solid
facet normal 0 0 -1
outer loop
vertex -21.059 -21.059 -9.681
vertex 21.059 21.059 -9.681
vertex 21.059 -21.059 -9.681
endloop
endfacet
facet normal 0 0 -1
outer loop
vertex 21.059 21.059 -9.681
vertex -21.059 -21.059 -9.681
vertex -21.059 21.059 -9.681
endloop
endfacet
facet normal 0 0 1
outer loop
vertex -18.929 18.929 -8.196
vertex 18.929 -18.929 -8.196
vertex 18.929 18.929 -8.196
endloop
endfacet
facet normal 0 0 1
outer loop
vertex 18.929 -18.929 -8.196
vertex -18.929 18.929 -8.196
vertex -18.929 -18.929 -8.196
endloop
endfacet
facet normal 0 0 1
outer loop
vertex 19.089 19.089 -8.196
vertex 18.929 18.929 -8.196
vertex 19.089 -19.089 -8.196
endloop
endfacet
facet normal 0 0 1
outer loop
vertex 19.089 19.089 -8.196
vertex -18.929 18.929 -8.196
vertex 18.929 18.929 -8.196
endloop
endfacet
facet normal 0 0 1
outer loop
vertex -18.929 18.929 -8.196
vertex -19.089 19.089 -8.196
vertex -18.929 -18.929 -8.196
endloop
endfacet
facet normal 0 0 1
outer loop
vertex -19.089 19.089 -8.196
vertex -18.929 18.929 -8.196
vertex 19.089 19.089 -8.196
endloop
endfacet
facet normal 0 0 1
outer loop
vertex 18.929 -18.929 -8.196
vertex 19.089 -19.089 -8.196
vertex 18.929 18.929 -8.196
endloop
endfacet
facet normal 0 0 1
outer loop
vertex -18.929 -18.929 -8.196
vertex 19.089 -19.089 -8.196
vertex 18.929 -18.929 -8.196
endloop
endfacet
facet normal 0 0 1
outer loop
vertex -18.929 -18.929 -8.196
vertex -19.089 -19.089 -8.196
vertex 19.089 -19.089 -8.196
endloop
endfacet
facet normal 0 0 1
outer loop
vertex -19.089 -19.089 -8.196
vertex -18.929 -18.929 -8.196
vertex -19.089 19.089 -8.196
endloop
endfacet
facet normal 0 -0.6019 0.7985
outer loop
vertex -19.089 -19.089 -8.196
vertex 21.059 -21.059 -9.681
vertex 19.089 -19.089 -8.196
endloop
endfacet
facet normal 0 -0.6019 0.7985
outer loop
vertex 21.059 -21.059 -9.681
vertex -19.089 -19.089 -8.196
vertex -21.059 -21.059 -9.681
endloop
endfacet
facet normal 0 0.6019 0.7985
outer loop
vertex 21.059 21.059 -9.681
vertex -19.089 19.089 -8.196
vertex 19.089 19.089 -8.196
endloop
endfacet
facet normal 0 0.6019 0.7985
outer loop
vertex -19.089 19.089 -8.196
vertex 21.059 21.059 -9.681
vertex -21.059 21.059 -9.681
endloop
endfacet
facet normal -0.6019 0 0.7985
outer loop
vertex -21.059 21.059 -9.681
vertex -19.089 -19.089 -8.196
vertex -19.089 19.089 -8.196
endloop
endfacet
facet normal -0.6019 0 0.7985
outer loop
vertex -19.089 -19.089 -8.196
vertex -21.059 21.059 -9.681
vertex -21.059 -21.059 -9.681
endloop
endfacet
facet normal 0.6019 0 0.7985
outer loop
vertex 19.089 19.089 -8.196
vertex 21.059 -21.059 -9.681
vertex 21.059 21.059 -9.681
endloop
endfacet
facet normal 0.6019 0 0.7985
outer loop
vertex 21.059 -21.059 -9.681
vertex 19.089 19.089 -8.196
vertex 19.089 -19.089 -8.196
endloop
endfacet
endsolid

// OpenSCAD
arete = 46.1;
hauteur = 29.336;
paroi = 1.5;
biseau = 1; // booléen
echelleReductionAjustementBouchon = 0.97;
libEcho=false;


hauteurInterieure = hauteur - 3 * paroi;
areteInterieure = hauteurInterieure * arete / hauteur;

echo(areteInterieure);


//forme_creuse();
//decoupe_bouchon();
// corps_ouvert();
bouchon();


module corps_ouvert() {
    render(convexity=2)
    rotate([180-51.8, 0, 0])
    difference() {
        forme_creuse();
        decoupe_bouchon();
    }
}

module bouchon() {
    render()
//    rotate([180, 0, 0])
    scale([echelleReductionAjustementBouchon, echelleReductionAjustementBouchon, 0.99])
    difference () {
        intersection() {
            forme_creuse();
            decoupe_bouchon(echelleReductionAjustementBouchon);
        }
    }
}

module forme_creuse() {
    difference() {
        pyramid(side=arete, height=hauteur, square=true, centerHorizontal=true, centerVertical=true);
        pyramid(side=areteInterieure, height=hauteurInterieure, square=true, centerHorizontal=true, centerVertical=true);
    }
}

module decoupe_bouchon(scale=1) {
    distance = -hauteur/3;
    $fn=4;
    if (biseau) {
        rotate([0,0,45]) translate([0,0, distance])
            cylinder(paroi, r=arete*0.666, r2=(arete-paroi)*0.624);
    } else {
        rotate([0,0,45]) translate([0,0, distance])
            cylinder(paroi, r=arete*0.65, center=true);
        rotate([0,0,45]) translate([0,0, distance+paroi/2])
            cylinder(paroi, r=(arete-paroi)*0.62, center=true);
    }
}





/*      MY Libraries v1.1 - Common Components
        Unless stated otherwise, all modules
        are by Randy Young <dadick83@hotmail.com>
        2010, 2011.   License, GPL v2 or later
**************************************************/

displayMode= rezScreen();  // (resolution)

function rezPrinter()=0;
function rezScreen()=1;

function resolution(value) =
    displayMode==1 ? 360 : value*2*3.141592; // ~1mm resolution for printer
$fn=resolution(4); // default for cylinder & sphere

function vectorDistance(v1, v2) =
    sqrt((pow(v2[0]-v1[0],2)+pow(v2[1]-v1[1],2))+pow(v2[2]-v1[2],2));
// function for linear measurement from 2, 3d vectors)

ep=0.01; //small number to avoid overlaps (non-manifold models)
in=25.4; //inches to millimeter conversion


/***** ROTATION & TRANSLATION SHORTCUTS  *****
Used for common, easy to type single axis moves
with names I can actually remember (since I never
get the rotation directions right on first try. :o)   */

function tighten (angle=90) =
        [0,0,-1*angle];

function loosen (angle=90) =
        [0,0,angle];

function righty (angle=90) =
        [0,angle,0];

function lefty (angle=90) =
        [0,-1*angle,0];

function backward (angle=90) =
        [-1*angle,0,0];

function forward (angle=90) =
        [angle,0,0];

function push(distance=1) =
        [0,distance,0];

function lift(distance=1) =
        [0,0,distance];

function slide(distance=1) =
        [distance,0,0];

/*************************************************
BASIC ENGINEERING SHAPES */

module hex (width=10, height=10, flats= true, center=false){
    radius= (flats == true ? width/sin(60)/2 : width/2 );
        cylinder (r=radius, h=height, center=center, $fn=6);
}

module equilateralTriangle (side=10, height=10, center=false){
    translate(center==true ? [-side/2,-sqrt(3)*side/6,-height/2] : [0,0,0])
        linear_extrude(height=height)
            polygon(points=[[0,0],[side,0],[side/2,sqrt(3)*side/2]]);
}

module pyramid(side=10, height=-1, square=false, centerHorizontal=true, centerVertical=false){
// creates a 3 or 4 sided pyramid.  -1 height= tetrahedron or Johnson's Solid square pyramid
    mHeight= height!=-1 ? height:
        square == true ? (1/sqrt(2))*side:      //square
            sqrt(6)/3*side;                     //tetra
    vert= centerVertical!=true ? [0,0,0]:
        square==false ? [0,0,-mHeight/4] :   //inscribes a tetra inside a sphere, not 1/2 ht
            [0,0,-mHeight/3];   //for squares, center=false inscribes, so true is just 1/2 ht
    horiz= centerHorizontal!= true ? [0,0,0] :
        square == true ? [-side/2, -side/2, 0] :    //square
            [-side/2,-sqrt(3)*side/6 ,0];           //tetra
    translate(vert+horiz){
        if (square == true){
            polyhedron (    points = [[0,0,0],[0,side,0],[side,side,0],
                                [side,0,0],[side/2,side/2,mHeight]],
                        faces = [[1,0,2], [2,0,3], [0,4,3],
                                [3,4,2], [2,4,1], [1,4,0]]);
        }
        if (square != true){
            polyhedron (    points = [[0,0,0],[side,0,0],[side/2,sqrt(3)*side/2,0],
                                [side/2,sqrt(3)*side/6,mHeight]],
                        faces = [[0,1,2], [1,0,3], [2,1,3],[2,3,0]]);
        }
}   }

module tube(r=2, thickness=1, height=1, center=false, outline=false){
    translate(lift(center == true ?  0 : 0.5*height))
    difference(){
        cylinder(r=r, h=height, center=true, $fn=resolution(r));
        if (outline!=true)
            cylinder(r=r-thickness+ep, h=height+2*ep, center=true, $fn=resolution(r-thickness));
}   }

module roundRect (size=[10,10,10], round=3, center=false){
    $fn=resolution(round);
    radius = min(round, size[0]/2, size[1]/2);
    union(){
        translate(center==true ? [-size[0]/2,-size[1]/2,-size[2]/2] : [0,0,0]){
            translate([radius,radius,0])
                cylinder (r=radius, h=size[2]);
            translate([size[0]-radius,radius,0])
                cylinder (r=radius, h=size[2]);
            translate([size[0]-radius,size[1]-radius,0])
                cylinder (r=radius, h=size[2]);
            translate([radius,size[1]-radius,0])
                cylinder (r=radius, h=size[2]);
            translate([0,radius,0])
                cube(size-[0,radius*2,0]);
            translate([radius,0,0])
                cube(size-[radius*2,0,0]);
}   }   }

module keyhole(r1, r2, length, height) {
    translate ([0,length/2,0]) union(){
        translate ([0,length/2-r1,0])
            cylinder (r=r1, height, $fn=resolution(r1));
        translate ([0,0-(length/2-r2),0])
            cylinder (r=r2, height, $fn=resolution(r2));
        translate ([-r1,r1-length/2,0])
            cube ([r1*2,length-(r1*2),height]);
    }
}

module slot(size=[4,10,1], startRound=true, endRound=true, centerXYZ=[1,0,0]){
    $fn=resolution(size[0]/2);
    radius=size[0]/2;
    start= startRound==true ? radius : 0;
    end= endRound==true ? radius : 0;
    translate([-size[0]/2*centerXYZ[0],
            -size[1]/2*centerXYZ[1],
            -size[2]/2*centerXYZ[2]])
    union(){
        translate([0,start,0]) cube (size-[0,start+end,0]);
        if (startRound==true) translate ([radius,radius,0])
            cylinder (r=size[0]/2, h=size[2]);
        if (endRound==true) translate ([radius,size[1]-radius,0])
            cylinder (r=size[0]/2, h=size[2]);

}   }

module dovetail (width=9, height=10, male=true){
    w= (male==true) ? width*0.975 : width;
    translate(slide(2.4)) union(){
        rotate(tighten(30))
            equilateralTriangle(w,height, center=true);
        translate(slide(-4.5)) cube([4.2,width*1.5,height], center=true);}
}

module teardrop(radius=5, length=10, angle=90) {
// teardrop module by whosawhatsis <www.thingiverse.com/thing:3457>
// Creative Commons LGPL, 2010.  I added default values and resolution code
    $fn=resolution(radius);
    rotate([0, angle, 0]) union() {
        linear_extrude(height = length, center = true, convexity = radius, twist = 0)
            circle(r = radius, center = true);
        linear_extrude(height = length, center = true, convexity = radius, twist = 0)
            projection(cut = false) rotate([0, -angle, 0])
            translate([0, 0, radius * sin(45) * 1.5])
            cylinder(h = radius * sin(45), r1 = radius * sin(45), r2 = 0,
                    center = true);
    }
}


/*************************************************
HARDWARE COMPONENTS */

module hexNut(size="M3", center=false, outline=false, pos=[0,0,0]){
    if (tableRow(size) == -1)   echo(str("hexNut ERROR: size of '",size,"' is undefined."));
    width = tableEntry (size, "nutWidth");
    height = tableEntry (size, "nutThickness");
    hole = tableEntry (size, "nutID");
    translate(pos+lift(center == true ?  0 : 0.5*height)) difference(){
        hex(width, height, center=true);
        if (outline!=true)
            cylinder(r=hole/2+0.01, h=height+0.02, center=true, $fn=resolution(hole/2));
}   }

module washer(size="M3", center=false, outline=false, pos=[0,0,0]){
    if (tableRow(size) == -1)   echo(str("washer ERROR: size of '",size,"' is undefined."));
    width = tableEntry (size, "washerOD");
    height = tableEntry (size, "washerThickness");
    hole = tableEntry (size, "washerID");
    translate(pos) tube(width/2,(width-hole)/2,height,center,outline);
}

module capBolt (size="M3", length= 16, center=false, pos=[0,0,0])   {
    if (tableRow(size) == -1)   echo(str("capBolt ERROR: size of '",size,"' is undefined."));
    diameter = tableEntry (size, "headDiameter");
    head = tableEntry (size, "headThickness");
    stud = tableEntry (size, "studDiameter");
    translate(pos+[0,0,center == true ? -length/2 : 0]) union() {
        translate(lift(-head)){
            cylinder(r=diameter/2, h=head, $fn=resolution(diameter/2));
            cylinder(r=stud/2, h=length+head, $fn=resolution(stud/2));
}   }   }

module hexBolt (size="M3", length= 16, center=false, pos=[0,0,0])   {
    if (tableRow(size) == -1)   echo(str("hexBolt ERROR: size of '",size,"' is undefined."));
    width = tableEntry (size, "headDiameter");
    head = tableEntry (size, "headThickness");
    stud = tableEntry (size, "studDiameter");
    translate(pos+[0,0,center == true ? -length/2 : 0]) union() {
        translate(lift(-head)){
            hex(width, head, $fn=6);
            cylinder(r=stud/2, h=length+head, $fn=resolution(stud/2));
}   }   }

module bearing (size="Skate", center=false, outline=false, pos=[0,0,0]){
// The Elmom MCAD has a much better version of a bearing module.
// This is a basic donut shape but gets the job done for construction.
    if (tableRow(size) == -1)   echo(str("bearing ERROR: type of '",type,"' is undefined."));
    hole = tableEntry (size, "bearingID");
    thickness = tableEntry (size, "bearingThickness");
    diameter = tableEntry (size, "bearingOD");
    translate(pos)
        tube(diameter/2, (diameter-hole)/2, thickness, center, outline);
}

/*************************************************
/****  TABLE DATA AND SUPPORT FUNCTIONS     ****
The following functions contain various engineering tables but you can add whatever data
you'd like.  I've also used it for translation landmarks.  The table itself is arranged with an array of arrays (vectors) and stored within the "tableRow" function with each row having a string identifier.  Thus, you can retrieve a vector by name without storing a bunch of variables.
    A second array function, called "columnNames" is simply a convenient way to refer to each element within a vector by an element name.  The values overlap, depending on what data type you're working with.  For instance, "bearingWidth" = "headThickness" = z-vector element = 2.
    You can find a specific variable within the data, using "rowElement" that uses row, column strings to identify the element desired.  Uncomment the example below to see it in action.
                        *****/
//testTable();
        module testTable(){
            column = "nutWidth";
            row =   "M3";

            echo (str(column," is found in column #",
                columnName(column)  ));
            echo (str("The row named ",row," contains: ",
                tableRow(row)       ));
            echo (str("The ",column," field of the ",row," row is: ",
                tableEntry(row,column)  ));
        }

function columnName(name)=
    // Bearings
        name == "bearingID"         ? 0 :
        name == "bearingOD"         ? 1 :
        name == "bearingThickness"?2 :
    // Bolts
        name == "studDiameter"  ? 0 :
        name == "headDiameter"  ? 1 :
        name == "headThickness"     ? 2 :
    // Nuts
        name == "nutID"         ? 0 :
        name == "nutWidth"      ? 3 :
        name == "nutThickness"  ? 4 :
    // Washers
        name == "washerID"      ? 0 :
        name == "washerOD"      ? 5 :
        name == "washerThickness"? 6 :
    -1; // Not Found.  Results in Undef fields.

function tableRow (name)=
    // Bearing Names
        name == "606"       ? [6, 13, 6] :
        name == "608"       ? [8, 22, 7] :
        name == "624"       ? [4, 13, 5] :
        name == "Skate"         ? [8, 22, 7] :
    // Bolt, Nut, Washer Sizes
    // It seems hardware size standards are loose, so these dimensions may not match your hardware.
        name == "M2"        ? [2, 4, 2, 4, 1.6, 5.5, 0.3] :
        name == "M2.5"      ? [2.5, 5, 2.5, 5, 2, 7, 0.5] :
        name == "M3"        ? [3, 5.5, 3, 5.5, 2.4, 7, 0.5] :
        name == "M4"        ? [4, 7.0, 4, 7, 3.2, 9, 0.8] :
        name == "M5"        ? [5, 8.5, 5, 8, 4.7, 10, 1] :
        name == "M6"        ? [6, 10, 6, 10, 5.2, 12.5, 1.6 ] :
        name == "M8"        ? [8, 13, 8, 13, 6.8, 17, 1.8] :
        name == "#8"            ? [0.164*in, 7.1, 0.164*in, 11/32*in, 3.05, in/2, in*0.04] :
        name == "1/4 Hex"   ? [in/4, in*0.505, in*11/64, in*7/16, in*5/32, in*0.734, in*0.063] :
        name == "5/16 Hex"  ? [in*5/16, in*0.577, in*7/32, in/2, in*3/16, in*0.875, in*0.063] :
    -1; //Not found in Table

function tableEntry (rowName, fieldName) =
    tableRow(rowName)[columnName(fieldName)];


/*************************************************
OPENSCAD INTERFACE & EXAMPLES */

libEcho=true;
if (libEcho!=false){
    echo ("****************************************************************  ");
    echo ("  'Libs' library loaded. For a list of modules, use libHelp();            ");
    echo ("   For help with translation/rotation functions, use libMoveHelp();");
    echo ("   For examples of each object, use libDemo();                             ");
    echo ("   To turn off this header, place libEcho=false; in your script        ");
    echo ("   libs.scad is @ http://www.thingiverse.com/thing:6021             ");
    echo ("****************** By randyy, 2011, LGPL v2+ ******************  ");
}

module libDemo(){
    translate(slide(15)) pyramid();
    translate(lift(5)) equilateralTriangle(center=true);
    translate(slide(-15)) pyramid(square=true);
    translate(slide(15)+push(15)) tube(5,2, height=10);
    translate([-5,10,0]) roundRect();
    translate([-15,15,0]) hex();
    translate([15,-25,0]) slot([4,15,4],true,false);
    translate([0,-25,0]) keyhole(2,4,15,4);
    translate([-30,-10,0]) hexNut();
    translate([-30,-20,0]) washer();
    translate([-30,0,tableEntry("#8","headThickness")]) capBolt("M3",12);
    translate([-30,15,tableEntry("#8","headThickness")]) hexBolt("#8",12);
    translate([-15,-18,0]) rotate(tighten()) dovetail(9,4);
}

module libHelp(){
    echo();
    echo("  ***********************   libHelp   **************************");
    echo("  displayMode= 1;  // 0=printer, 1=screen (resolution)  ");
    echo("  hex (width=10, height=10, flats= true, center=false)  ");
    echo("  equilateralTriangle (side=10, height=10, center=false)  ");
    echo("  pyramid(side=10, height=-1, square=false, centerHorizontal=true, centerVertical=false)  ");
    echo("  tube(r=2, thickness=1, height=1, center=false, outline=false)  ");
    echo("  roundRect (size=[10,10,10], round=3, center=false)  ");
    echo("  keyhole(r1, r2, length, height)  ");
    echo("  slot(size=[4,10,1], startRound=true, endRound=true, centerXYZ=[1,0,0])  ");
    echo("  dovetail (width=9, height=10, male=true)  ");
    echo("  teardrop(radius=5, length=10, angle=90)  ");
    echo("  hexNut(size='M3', center=false, outline=false, pos=[0,0,0])  ");
    echo("  washer(size='M3', center=false, outline=false, pos=[0,0,0])  ");
    echo("  capBolt (size='M3', length= 16, center=false, pos=[0,0,0])  ");
    echo("  hexBolt (size='M3', length= 16, center=false, pos=[0,0,0])  ");
    echo("  bearing (size='Skate', center=false, outline=false, pos=[0,0,0])  ");
    echo("  TABLE FUNCTIONS  ");
    echo("  function columnName(name)  ");
    echo("  function tableRow (name)  ");
    echo("  function tableEntry (rowName, fieldName)  ");
    echo();
}

module libMoveHelp(){
    echo();
    echo("  *********************   libMoveHelp   ************************");
    echo("  ROTATION - default is 90 degrees, but you can use any value in ().  ");
    echo("     tighten(), clockwise, along z                                                       ");
    echo("     loosen(), counterclockwise, along z                                            ");
    echo("     righty(), leans right, along y axis                                                ");
    echo("     lefty(), leans left, along y axis                                                     ");
    echo("     backward() falls away, along x axis                                             ");
    echo("     forward() falls toward you, along x axis                                      ");
    echo("  TRANSLATION - negative numbers move in opposite direction      ");
    echo("     push(distance) moves object away, along y                                 ");
    echo("     lift(distance) moves object up, along z                                        ");
    echo("     slide(distance) moves object right, along x                                 ");
    echo();
}
